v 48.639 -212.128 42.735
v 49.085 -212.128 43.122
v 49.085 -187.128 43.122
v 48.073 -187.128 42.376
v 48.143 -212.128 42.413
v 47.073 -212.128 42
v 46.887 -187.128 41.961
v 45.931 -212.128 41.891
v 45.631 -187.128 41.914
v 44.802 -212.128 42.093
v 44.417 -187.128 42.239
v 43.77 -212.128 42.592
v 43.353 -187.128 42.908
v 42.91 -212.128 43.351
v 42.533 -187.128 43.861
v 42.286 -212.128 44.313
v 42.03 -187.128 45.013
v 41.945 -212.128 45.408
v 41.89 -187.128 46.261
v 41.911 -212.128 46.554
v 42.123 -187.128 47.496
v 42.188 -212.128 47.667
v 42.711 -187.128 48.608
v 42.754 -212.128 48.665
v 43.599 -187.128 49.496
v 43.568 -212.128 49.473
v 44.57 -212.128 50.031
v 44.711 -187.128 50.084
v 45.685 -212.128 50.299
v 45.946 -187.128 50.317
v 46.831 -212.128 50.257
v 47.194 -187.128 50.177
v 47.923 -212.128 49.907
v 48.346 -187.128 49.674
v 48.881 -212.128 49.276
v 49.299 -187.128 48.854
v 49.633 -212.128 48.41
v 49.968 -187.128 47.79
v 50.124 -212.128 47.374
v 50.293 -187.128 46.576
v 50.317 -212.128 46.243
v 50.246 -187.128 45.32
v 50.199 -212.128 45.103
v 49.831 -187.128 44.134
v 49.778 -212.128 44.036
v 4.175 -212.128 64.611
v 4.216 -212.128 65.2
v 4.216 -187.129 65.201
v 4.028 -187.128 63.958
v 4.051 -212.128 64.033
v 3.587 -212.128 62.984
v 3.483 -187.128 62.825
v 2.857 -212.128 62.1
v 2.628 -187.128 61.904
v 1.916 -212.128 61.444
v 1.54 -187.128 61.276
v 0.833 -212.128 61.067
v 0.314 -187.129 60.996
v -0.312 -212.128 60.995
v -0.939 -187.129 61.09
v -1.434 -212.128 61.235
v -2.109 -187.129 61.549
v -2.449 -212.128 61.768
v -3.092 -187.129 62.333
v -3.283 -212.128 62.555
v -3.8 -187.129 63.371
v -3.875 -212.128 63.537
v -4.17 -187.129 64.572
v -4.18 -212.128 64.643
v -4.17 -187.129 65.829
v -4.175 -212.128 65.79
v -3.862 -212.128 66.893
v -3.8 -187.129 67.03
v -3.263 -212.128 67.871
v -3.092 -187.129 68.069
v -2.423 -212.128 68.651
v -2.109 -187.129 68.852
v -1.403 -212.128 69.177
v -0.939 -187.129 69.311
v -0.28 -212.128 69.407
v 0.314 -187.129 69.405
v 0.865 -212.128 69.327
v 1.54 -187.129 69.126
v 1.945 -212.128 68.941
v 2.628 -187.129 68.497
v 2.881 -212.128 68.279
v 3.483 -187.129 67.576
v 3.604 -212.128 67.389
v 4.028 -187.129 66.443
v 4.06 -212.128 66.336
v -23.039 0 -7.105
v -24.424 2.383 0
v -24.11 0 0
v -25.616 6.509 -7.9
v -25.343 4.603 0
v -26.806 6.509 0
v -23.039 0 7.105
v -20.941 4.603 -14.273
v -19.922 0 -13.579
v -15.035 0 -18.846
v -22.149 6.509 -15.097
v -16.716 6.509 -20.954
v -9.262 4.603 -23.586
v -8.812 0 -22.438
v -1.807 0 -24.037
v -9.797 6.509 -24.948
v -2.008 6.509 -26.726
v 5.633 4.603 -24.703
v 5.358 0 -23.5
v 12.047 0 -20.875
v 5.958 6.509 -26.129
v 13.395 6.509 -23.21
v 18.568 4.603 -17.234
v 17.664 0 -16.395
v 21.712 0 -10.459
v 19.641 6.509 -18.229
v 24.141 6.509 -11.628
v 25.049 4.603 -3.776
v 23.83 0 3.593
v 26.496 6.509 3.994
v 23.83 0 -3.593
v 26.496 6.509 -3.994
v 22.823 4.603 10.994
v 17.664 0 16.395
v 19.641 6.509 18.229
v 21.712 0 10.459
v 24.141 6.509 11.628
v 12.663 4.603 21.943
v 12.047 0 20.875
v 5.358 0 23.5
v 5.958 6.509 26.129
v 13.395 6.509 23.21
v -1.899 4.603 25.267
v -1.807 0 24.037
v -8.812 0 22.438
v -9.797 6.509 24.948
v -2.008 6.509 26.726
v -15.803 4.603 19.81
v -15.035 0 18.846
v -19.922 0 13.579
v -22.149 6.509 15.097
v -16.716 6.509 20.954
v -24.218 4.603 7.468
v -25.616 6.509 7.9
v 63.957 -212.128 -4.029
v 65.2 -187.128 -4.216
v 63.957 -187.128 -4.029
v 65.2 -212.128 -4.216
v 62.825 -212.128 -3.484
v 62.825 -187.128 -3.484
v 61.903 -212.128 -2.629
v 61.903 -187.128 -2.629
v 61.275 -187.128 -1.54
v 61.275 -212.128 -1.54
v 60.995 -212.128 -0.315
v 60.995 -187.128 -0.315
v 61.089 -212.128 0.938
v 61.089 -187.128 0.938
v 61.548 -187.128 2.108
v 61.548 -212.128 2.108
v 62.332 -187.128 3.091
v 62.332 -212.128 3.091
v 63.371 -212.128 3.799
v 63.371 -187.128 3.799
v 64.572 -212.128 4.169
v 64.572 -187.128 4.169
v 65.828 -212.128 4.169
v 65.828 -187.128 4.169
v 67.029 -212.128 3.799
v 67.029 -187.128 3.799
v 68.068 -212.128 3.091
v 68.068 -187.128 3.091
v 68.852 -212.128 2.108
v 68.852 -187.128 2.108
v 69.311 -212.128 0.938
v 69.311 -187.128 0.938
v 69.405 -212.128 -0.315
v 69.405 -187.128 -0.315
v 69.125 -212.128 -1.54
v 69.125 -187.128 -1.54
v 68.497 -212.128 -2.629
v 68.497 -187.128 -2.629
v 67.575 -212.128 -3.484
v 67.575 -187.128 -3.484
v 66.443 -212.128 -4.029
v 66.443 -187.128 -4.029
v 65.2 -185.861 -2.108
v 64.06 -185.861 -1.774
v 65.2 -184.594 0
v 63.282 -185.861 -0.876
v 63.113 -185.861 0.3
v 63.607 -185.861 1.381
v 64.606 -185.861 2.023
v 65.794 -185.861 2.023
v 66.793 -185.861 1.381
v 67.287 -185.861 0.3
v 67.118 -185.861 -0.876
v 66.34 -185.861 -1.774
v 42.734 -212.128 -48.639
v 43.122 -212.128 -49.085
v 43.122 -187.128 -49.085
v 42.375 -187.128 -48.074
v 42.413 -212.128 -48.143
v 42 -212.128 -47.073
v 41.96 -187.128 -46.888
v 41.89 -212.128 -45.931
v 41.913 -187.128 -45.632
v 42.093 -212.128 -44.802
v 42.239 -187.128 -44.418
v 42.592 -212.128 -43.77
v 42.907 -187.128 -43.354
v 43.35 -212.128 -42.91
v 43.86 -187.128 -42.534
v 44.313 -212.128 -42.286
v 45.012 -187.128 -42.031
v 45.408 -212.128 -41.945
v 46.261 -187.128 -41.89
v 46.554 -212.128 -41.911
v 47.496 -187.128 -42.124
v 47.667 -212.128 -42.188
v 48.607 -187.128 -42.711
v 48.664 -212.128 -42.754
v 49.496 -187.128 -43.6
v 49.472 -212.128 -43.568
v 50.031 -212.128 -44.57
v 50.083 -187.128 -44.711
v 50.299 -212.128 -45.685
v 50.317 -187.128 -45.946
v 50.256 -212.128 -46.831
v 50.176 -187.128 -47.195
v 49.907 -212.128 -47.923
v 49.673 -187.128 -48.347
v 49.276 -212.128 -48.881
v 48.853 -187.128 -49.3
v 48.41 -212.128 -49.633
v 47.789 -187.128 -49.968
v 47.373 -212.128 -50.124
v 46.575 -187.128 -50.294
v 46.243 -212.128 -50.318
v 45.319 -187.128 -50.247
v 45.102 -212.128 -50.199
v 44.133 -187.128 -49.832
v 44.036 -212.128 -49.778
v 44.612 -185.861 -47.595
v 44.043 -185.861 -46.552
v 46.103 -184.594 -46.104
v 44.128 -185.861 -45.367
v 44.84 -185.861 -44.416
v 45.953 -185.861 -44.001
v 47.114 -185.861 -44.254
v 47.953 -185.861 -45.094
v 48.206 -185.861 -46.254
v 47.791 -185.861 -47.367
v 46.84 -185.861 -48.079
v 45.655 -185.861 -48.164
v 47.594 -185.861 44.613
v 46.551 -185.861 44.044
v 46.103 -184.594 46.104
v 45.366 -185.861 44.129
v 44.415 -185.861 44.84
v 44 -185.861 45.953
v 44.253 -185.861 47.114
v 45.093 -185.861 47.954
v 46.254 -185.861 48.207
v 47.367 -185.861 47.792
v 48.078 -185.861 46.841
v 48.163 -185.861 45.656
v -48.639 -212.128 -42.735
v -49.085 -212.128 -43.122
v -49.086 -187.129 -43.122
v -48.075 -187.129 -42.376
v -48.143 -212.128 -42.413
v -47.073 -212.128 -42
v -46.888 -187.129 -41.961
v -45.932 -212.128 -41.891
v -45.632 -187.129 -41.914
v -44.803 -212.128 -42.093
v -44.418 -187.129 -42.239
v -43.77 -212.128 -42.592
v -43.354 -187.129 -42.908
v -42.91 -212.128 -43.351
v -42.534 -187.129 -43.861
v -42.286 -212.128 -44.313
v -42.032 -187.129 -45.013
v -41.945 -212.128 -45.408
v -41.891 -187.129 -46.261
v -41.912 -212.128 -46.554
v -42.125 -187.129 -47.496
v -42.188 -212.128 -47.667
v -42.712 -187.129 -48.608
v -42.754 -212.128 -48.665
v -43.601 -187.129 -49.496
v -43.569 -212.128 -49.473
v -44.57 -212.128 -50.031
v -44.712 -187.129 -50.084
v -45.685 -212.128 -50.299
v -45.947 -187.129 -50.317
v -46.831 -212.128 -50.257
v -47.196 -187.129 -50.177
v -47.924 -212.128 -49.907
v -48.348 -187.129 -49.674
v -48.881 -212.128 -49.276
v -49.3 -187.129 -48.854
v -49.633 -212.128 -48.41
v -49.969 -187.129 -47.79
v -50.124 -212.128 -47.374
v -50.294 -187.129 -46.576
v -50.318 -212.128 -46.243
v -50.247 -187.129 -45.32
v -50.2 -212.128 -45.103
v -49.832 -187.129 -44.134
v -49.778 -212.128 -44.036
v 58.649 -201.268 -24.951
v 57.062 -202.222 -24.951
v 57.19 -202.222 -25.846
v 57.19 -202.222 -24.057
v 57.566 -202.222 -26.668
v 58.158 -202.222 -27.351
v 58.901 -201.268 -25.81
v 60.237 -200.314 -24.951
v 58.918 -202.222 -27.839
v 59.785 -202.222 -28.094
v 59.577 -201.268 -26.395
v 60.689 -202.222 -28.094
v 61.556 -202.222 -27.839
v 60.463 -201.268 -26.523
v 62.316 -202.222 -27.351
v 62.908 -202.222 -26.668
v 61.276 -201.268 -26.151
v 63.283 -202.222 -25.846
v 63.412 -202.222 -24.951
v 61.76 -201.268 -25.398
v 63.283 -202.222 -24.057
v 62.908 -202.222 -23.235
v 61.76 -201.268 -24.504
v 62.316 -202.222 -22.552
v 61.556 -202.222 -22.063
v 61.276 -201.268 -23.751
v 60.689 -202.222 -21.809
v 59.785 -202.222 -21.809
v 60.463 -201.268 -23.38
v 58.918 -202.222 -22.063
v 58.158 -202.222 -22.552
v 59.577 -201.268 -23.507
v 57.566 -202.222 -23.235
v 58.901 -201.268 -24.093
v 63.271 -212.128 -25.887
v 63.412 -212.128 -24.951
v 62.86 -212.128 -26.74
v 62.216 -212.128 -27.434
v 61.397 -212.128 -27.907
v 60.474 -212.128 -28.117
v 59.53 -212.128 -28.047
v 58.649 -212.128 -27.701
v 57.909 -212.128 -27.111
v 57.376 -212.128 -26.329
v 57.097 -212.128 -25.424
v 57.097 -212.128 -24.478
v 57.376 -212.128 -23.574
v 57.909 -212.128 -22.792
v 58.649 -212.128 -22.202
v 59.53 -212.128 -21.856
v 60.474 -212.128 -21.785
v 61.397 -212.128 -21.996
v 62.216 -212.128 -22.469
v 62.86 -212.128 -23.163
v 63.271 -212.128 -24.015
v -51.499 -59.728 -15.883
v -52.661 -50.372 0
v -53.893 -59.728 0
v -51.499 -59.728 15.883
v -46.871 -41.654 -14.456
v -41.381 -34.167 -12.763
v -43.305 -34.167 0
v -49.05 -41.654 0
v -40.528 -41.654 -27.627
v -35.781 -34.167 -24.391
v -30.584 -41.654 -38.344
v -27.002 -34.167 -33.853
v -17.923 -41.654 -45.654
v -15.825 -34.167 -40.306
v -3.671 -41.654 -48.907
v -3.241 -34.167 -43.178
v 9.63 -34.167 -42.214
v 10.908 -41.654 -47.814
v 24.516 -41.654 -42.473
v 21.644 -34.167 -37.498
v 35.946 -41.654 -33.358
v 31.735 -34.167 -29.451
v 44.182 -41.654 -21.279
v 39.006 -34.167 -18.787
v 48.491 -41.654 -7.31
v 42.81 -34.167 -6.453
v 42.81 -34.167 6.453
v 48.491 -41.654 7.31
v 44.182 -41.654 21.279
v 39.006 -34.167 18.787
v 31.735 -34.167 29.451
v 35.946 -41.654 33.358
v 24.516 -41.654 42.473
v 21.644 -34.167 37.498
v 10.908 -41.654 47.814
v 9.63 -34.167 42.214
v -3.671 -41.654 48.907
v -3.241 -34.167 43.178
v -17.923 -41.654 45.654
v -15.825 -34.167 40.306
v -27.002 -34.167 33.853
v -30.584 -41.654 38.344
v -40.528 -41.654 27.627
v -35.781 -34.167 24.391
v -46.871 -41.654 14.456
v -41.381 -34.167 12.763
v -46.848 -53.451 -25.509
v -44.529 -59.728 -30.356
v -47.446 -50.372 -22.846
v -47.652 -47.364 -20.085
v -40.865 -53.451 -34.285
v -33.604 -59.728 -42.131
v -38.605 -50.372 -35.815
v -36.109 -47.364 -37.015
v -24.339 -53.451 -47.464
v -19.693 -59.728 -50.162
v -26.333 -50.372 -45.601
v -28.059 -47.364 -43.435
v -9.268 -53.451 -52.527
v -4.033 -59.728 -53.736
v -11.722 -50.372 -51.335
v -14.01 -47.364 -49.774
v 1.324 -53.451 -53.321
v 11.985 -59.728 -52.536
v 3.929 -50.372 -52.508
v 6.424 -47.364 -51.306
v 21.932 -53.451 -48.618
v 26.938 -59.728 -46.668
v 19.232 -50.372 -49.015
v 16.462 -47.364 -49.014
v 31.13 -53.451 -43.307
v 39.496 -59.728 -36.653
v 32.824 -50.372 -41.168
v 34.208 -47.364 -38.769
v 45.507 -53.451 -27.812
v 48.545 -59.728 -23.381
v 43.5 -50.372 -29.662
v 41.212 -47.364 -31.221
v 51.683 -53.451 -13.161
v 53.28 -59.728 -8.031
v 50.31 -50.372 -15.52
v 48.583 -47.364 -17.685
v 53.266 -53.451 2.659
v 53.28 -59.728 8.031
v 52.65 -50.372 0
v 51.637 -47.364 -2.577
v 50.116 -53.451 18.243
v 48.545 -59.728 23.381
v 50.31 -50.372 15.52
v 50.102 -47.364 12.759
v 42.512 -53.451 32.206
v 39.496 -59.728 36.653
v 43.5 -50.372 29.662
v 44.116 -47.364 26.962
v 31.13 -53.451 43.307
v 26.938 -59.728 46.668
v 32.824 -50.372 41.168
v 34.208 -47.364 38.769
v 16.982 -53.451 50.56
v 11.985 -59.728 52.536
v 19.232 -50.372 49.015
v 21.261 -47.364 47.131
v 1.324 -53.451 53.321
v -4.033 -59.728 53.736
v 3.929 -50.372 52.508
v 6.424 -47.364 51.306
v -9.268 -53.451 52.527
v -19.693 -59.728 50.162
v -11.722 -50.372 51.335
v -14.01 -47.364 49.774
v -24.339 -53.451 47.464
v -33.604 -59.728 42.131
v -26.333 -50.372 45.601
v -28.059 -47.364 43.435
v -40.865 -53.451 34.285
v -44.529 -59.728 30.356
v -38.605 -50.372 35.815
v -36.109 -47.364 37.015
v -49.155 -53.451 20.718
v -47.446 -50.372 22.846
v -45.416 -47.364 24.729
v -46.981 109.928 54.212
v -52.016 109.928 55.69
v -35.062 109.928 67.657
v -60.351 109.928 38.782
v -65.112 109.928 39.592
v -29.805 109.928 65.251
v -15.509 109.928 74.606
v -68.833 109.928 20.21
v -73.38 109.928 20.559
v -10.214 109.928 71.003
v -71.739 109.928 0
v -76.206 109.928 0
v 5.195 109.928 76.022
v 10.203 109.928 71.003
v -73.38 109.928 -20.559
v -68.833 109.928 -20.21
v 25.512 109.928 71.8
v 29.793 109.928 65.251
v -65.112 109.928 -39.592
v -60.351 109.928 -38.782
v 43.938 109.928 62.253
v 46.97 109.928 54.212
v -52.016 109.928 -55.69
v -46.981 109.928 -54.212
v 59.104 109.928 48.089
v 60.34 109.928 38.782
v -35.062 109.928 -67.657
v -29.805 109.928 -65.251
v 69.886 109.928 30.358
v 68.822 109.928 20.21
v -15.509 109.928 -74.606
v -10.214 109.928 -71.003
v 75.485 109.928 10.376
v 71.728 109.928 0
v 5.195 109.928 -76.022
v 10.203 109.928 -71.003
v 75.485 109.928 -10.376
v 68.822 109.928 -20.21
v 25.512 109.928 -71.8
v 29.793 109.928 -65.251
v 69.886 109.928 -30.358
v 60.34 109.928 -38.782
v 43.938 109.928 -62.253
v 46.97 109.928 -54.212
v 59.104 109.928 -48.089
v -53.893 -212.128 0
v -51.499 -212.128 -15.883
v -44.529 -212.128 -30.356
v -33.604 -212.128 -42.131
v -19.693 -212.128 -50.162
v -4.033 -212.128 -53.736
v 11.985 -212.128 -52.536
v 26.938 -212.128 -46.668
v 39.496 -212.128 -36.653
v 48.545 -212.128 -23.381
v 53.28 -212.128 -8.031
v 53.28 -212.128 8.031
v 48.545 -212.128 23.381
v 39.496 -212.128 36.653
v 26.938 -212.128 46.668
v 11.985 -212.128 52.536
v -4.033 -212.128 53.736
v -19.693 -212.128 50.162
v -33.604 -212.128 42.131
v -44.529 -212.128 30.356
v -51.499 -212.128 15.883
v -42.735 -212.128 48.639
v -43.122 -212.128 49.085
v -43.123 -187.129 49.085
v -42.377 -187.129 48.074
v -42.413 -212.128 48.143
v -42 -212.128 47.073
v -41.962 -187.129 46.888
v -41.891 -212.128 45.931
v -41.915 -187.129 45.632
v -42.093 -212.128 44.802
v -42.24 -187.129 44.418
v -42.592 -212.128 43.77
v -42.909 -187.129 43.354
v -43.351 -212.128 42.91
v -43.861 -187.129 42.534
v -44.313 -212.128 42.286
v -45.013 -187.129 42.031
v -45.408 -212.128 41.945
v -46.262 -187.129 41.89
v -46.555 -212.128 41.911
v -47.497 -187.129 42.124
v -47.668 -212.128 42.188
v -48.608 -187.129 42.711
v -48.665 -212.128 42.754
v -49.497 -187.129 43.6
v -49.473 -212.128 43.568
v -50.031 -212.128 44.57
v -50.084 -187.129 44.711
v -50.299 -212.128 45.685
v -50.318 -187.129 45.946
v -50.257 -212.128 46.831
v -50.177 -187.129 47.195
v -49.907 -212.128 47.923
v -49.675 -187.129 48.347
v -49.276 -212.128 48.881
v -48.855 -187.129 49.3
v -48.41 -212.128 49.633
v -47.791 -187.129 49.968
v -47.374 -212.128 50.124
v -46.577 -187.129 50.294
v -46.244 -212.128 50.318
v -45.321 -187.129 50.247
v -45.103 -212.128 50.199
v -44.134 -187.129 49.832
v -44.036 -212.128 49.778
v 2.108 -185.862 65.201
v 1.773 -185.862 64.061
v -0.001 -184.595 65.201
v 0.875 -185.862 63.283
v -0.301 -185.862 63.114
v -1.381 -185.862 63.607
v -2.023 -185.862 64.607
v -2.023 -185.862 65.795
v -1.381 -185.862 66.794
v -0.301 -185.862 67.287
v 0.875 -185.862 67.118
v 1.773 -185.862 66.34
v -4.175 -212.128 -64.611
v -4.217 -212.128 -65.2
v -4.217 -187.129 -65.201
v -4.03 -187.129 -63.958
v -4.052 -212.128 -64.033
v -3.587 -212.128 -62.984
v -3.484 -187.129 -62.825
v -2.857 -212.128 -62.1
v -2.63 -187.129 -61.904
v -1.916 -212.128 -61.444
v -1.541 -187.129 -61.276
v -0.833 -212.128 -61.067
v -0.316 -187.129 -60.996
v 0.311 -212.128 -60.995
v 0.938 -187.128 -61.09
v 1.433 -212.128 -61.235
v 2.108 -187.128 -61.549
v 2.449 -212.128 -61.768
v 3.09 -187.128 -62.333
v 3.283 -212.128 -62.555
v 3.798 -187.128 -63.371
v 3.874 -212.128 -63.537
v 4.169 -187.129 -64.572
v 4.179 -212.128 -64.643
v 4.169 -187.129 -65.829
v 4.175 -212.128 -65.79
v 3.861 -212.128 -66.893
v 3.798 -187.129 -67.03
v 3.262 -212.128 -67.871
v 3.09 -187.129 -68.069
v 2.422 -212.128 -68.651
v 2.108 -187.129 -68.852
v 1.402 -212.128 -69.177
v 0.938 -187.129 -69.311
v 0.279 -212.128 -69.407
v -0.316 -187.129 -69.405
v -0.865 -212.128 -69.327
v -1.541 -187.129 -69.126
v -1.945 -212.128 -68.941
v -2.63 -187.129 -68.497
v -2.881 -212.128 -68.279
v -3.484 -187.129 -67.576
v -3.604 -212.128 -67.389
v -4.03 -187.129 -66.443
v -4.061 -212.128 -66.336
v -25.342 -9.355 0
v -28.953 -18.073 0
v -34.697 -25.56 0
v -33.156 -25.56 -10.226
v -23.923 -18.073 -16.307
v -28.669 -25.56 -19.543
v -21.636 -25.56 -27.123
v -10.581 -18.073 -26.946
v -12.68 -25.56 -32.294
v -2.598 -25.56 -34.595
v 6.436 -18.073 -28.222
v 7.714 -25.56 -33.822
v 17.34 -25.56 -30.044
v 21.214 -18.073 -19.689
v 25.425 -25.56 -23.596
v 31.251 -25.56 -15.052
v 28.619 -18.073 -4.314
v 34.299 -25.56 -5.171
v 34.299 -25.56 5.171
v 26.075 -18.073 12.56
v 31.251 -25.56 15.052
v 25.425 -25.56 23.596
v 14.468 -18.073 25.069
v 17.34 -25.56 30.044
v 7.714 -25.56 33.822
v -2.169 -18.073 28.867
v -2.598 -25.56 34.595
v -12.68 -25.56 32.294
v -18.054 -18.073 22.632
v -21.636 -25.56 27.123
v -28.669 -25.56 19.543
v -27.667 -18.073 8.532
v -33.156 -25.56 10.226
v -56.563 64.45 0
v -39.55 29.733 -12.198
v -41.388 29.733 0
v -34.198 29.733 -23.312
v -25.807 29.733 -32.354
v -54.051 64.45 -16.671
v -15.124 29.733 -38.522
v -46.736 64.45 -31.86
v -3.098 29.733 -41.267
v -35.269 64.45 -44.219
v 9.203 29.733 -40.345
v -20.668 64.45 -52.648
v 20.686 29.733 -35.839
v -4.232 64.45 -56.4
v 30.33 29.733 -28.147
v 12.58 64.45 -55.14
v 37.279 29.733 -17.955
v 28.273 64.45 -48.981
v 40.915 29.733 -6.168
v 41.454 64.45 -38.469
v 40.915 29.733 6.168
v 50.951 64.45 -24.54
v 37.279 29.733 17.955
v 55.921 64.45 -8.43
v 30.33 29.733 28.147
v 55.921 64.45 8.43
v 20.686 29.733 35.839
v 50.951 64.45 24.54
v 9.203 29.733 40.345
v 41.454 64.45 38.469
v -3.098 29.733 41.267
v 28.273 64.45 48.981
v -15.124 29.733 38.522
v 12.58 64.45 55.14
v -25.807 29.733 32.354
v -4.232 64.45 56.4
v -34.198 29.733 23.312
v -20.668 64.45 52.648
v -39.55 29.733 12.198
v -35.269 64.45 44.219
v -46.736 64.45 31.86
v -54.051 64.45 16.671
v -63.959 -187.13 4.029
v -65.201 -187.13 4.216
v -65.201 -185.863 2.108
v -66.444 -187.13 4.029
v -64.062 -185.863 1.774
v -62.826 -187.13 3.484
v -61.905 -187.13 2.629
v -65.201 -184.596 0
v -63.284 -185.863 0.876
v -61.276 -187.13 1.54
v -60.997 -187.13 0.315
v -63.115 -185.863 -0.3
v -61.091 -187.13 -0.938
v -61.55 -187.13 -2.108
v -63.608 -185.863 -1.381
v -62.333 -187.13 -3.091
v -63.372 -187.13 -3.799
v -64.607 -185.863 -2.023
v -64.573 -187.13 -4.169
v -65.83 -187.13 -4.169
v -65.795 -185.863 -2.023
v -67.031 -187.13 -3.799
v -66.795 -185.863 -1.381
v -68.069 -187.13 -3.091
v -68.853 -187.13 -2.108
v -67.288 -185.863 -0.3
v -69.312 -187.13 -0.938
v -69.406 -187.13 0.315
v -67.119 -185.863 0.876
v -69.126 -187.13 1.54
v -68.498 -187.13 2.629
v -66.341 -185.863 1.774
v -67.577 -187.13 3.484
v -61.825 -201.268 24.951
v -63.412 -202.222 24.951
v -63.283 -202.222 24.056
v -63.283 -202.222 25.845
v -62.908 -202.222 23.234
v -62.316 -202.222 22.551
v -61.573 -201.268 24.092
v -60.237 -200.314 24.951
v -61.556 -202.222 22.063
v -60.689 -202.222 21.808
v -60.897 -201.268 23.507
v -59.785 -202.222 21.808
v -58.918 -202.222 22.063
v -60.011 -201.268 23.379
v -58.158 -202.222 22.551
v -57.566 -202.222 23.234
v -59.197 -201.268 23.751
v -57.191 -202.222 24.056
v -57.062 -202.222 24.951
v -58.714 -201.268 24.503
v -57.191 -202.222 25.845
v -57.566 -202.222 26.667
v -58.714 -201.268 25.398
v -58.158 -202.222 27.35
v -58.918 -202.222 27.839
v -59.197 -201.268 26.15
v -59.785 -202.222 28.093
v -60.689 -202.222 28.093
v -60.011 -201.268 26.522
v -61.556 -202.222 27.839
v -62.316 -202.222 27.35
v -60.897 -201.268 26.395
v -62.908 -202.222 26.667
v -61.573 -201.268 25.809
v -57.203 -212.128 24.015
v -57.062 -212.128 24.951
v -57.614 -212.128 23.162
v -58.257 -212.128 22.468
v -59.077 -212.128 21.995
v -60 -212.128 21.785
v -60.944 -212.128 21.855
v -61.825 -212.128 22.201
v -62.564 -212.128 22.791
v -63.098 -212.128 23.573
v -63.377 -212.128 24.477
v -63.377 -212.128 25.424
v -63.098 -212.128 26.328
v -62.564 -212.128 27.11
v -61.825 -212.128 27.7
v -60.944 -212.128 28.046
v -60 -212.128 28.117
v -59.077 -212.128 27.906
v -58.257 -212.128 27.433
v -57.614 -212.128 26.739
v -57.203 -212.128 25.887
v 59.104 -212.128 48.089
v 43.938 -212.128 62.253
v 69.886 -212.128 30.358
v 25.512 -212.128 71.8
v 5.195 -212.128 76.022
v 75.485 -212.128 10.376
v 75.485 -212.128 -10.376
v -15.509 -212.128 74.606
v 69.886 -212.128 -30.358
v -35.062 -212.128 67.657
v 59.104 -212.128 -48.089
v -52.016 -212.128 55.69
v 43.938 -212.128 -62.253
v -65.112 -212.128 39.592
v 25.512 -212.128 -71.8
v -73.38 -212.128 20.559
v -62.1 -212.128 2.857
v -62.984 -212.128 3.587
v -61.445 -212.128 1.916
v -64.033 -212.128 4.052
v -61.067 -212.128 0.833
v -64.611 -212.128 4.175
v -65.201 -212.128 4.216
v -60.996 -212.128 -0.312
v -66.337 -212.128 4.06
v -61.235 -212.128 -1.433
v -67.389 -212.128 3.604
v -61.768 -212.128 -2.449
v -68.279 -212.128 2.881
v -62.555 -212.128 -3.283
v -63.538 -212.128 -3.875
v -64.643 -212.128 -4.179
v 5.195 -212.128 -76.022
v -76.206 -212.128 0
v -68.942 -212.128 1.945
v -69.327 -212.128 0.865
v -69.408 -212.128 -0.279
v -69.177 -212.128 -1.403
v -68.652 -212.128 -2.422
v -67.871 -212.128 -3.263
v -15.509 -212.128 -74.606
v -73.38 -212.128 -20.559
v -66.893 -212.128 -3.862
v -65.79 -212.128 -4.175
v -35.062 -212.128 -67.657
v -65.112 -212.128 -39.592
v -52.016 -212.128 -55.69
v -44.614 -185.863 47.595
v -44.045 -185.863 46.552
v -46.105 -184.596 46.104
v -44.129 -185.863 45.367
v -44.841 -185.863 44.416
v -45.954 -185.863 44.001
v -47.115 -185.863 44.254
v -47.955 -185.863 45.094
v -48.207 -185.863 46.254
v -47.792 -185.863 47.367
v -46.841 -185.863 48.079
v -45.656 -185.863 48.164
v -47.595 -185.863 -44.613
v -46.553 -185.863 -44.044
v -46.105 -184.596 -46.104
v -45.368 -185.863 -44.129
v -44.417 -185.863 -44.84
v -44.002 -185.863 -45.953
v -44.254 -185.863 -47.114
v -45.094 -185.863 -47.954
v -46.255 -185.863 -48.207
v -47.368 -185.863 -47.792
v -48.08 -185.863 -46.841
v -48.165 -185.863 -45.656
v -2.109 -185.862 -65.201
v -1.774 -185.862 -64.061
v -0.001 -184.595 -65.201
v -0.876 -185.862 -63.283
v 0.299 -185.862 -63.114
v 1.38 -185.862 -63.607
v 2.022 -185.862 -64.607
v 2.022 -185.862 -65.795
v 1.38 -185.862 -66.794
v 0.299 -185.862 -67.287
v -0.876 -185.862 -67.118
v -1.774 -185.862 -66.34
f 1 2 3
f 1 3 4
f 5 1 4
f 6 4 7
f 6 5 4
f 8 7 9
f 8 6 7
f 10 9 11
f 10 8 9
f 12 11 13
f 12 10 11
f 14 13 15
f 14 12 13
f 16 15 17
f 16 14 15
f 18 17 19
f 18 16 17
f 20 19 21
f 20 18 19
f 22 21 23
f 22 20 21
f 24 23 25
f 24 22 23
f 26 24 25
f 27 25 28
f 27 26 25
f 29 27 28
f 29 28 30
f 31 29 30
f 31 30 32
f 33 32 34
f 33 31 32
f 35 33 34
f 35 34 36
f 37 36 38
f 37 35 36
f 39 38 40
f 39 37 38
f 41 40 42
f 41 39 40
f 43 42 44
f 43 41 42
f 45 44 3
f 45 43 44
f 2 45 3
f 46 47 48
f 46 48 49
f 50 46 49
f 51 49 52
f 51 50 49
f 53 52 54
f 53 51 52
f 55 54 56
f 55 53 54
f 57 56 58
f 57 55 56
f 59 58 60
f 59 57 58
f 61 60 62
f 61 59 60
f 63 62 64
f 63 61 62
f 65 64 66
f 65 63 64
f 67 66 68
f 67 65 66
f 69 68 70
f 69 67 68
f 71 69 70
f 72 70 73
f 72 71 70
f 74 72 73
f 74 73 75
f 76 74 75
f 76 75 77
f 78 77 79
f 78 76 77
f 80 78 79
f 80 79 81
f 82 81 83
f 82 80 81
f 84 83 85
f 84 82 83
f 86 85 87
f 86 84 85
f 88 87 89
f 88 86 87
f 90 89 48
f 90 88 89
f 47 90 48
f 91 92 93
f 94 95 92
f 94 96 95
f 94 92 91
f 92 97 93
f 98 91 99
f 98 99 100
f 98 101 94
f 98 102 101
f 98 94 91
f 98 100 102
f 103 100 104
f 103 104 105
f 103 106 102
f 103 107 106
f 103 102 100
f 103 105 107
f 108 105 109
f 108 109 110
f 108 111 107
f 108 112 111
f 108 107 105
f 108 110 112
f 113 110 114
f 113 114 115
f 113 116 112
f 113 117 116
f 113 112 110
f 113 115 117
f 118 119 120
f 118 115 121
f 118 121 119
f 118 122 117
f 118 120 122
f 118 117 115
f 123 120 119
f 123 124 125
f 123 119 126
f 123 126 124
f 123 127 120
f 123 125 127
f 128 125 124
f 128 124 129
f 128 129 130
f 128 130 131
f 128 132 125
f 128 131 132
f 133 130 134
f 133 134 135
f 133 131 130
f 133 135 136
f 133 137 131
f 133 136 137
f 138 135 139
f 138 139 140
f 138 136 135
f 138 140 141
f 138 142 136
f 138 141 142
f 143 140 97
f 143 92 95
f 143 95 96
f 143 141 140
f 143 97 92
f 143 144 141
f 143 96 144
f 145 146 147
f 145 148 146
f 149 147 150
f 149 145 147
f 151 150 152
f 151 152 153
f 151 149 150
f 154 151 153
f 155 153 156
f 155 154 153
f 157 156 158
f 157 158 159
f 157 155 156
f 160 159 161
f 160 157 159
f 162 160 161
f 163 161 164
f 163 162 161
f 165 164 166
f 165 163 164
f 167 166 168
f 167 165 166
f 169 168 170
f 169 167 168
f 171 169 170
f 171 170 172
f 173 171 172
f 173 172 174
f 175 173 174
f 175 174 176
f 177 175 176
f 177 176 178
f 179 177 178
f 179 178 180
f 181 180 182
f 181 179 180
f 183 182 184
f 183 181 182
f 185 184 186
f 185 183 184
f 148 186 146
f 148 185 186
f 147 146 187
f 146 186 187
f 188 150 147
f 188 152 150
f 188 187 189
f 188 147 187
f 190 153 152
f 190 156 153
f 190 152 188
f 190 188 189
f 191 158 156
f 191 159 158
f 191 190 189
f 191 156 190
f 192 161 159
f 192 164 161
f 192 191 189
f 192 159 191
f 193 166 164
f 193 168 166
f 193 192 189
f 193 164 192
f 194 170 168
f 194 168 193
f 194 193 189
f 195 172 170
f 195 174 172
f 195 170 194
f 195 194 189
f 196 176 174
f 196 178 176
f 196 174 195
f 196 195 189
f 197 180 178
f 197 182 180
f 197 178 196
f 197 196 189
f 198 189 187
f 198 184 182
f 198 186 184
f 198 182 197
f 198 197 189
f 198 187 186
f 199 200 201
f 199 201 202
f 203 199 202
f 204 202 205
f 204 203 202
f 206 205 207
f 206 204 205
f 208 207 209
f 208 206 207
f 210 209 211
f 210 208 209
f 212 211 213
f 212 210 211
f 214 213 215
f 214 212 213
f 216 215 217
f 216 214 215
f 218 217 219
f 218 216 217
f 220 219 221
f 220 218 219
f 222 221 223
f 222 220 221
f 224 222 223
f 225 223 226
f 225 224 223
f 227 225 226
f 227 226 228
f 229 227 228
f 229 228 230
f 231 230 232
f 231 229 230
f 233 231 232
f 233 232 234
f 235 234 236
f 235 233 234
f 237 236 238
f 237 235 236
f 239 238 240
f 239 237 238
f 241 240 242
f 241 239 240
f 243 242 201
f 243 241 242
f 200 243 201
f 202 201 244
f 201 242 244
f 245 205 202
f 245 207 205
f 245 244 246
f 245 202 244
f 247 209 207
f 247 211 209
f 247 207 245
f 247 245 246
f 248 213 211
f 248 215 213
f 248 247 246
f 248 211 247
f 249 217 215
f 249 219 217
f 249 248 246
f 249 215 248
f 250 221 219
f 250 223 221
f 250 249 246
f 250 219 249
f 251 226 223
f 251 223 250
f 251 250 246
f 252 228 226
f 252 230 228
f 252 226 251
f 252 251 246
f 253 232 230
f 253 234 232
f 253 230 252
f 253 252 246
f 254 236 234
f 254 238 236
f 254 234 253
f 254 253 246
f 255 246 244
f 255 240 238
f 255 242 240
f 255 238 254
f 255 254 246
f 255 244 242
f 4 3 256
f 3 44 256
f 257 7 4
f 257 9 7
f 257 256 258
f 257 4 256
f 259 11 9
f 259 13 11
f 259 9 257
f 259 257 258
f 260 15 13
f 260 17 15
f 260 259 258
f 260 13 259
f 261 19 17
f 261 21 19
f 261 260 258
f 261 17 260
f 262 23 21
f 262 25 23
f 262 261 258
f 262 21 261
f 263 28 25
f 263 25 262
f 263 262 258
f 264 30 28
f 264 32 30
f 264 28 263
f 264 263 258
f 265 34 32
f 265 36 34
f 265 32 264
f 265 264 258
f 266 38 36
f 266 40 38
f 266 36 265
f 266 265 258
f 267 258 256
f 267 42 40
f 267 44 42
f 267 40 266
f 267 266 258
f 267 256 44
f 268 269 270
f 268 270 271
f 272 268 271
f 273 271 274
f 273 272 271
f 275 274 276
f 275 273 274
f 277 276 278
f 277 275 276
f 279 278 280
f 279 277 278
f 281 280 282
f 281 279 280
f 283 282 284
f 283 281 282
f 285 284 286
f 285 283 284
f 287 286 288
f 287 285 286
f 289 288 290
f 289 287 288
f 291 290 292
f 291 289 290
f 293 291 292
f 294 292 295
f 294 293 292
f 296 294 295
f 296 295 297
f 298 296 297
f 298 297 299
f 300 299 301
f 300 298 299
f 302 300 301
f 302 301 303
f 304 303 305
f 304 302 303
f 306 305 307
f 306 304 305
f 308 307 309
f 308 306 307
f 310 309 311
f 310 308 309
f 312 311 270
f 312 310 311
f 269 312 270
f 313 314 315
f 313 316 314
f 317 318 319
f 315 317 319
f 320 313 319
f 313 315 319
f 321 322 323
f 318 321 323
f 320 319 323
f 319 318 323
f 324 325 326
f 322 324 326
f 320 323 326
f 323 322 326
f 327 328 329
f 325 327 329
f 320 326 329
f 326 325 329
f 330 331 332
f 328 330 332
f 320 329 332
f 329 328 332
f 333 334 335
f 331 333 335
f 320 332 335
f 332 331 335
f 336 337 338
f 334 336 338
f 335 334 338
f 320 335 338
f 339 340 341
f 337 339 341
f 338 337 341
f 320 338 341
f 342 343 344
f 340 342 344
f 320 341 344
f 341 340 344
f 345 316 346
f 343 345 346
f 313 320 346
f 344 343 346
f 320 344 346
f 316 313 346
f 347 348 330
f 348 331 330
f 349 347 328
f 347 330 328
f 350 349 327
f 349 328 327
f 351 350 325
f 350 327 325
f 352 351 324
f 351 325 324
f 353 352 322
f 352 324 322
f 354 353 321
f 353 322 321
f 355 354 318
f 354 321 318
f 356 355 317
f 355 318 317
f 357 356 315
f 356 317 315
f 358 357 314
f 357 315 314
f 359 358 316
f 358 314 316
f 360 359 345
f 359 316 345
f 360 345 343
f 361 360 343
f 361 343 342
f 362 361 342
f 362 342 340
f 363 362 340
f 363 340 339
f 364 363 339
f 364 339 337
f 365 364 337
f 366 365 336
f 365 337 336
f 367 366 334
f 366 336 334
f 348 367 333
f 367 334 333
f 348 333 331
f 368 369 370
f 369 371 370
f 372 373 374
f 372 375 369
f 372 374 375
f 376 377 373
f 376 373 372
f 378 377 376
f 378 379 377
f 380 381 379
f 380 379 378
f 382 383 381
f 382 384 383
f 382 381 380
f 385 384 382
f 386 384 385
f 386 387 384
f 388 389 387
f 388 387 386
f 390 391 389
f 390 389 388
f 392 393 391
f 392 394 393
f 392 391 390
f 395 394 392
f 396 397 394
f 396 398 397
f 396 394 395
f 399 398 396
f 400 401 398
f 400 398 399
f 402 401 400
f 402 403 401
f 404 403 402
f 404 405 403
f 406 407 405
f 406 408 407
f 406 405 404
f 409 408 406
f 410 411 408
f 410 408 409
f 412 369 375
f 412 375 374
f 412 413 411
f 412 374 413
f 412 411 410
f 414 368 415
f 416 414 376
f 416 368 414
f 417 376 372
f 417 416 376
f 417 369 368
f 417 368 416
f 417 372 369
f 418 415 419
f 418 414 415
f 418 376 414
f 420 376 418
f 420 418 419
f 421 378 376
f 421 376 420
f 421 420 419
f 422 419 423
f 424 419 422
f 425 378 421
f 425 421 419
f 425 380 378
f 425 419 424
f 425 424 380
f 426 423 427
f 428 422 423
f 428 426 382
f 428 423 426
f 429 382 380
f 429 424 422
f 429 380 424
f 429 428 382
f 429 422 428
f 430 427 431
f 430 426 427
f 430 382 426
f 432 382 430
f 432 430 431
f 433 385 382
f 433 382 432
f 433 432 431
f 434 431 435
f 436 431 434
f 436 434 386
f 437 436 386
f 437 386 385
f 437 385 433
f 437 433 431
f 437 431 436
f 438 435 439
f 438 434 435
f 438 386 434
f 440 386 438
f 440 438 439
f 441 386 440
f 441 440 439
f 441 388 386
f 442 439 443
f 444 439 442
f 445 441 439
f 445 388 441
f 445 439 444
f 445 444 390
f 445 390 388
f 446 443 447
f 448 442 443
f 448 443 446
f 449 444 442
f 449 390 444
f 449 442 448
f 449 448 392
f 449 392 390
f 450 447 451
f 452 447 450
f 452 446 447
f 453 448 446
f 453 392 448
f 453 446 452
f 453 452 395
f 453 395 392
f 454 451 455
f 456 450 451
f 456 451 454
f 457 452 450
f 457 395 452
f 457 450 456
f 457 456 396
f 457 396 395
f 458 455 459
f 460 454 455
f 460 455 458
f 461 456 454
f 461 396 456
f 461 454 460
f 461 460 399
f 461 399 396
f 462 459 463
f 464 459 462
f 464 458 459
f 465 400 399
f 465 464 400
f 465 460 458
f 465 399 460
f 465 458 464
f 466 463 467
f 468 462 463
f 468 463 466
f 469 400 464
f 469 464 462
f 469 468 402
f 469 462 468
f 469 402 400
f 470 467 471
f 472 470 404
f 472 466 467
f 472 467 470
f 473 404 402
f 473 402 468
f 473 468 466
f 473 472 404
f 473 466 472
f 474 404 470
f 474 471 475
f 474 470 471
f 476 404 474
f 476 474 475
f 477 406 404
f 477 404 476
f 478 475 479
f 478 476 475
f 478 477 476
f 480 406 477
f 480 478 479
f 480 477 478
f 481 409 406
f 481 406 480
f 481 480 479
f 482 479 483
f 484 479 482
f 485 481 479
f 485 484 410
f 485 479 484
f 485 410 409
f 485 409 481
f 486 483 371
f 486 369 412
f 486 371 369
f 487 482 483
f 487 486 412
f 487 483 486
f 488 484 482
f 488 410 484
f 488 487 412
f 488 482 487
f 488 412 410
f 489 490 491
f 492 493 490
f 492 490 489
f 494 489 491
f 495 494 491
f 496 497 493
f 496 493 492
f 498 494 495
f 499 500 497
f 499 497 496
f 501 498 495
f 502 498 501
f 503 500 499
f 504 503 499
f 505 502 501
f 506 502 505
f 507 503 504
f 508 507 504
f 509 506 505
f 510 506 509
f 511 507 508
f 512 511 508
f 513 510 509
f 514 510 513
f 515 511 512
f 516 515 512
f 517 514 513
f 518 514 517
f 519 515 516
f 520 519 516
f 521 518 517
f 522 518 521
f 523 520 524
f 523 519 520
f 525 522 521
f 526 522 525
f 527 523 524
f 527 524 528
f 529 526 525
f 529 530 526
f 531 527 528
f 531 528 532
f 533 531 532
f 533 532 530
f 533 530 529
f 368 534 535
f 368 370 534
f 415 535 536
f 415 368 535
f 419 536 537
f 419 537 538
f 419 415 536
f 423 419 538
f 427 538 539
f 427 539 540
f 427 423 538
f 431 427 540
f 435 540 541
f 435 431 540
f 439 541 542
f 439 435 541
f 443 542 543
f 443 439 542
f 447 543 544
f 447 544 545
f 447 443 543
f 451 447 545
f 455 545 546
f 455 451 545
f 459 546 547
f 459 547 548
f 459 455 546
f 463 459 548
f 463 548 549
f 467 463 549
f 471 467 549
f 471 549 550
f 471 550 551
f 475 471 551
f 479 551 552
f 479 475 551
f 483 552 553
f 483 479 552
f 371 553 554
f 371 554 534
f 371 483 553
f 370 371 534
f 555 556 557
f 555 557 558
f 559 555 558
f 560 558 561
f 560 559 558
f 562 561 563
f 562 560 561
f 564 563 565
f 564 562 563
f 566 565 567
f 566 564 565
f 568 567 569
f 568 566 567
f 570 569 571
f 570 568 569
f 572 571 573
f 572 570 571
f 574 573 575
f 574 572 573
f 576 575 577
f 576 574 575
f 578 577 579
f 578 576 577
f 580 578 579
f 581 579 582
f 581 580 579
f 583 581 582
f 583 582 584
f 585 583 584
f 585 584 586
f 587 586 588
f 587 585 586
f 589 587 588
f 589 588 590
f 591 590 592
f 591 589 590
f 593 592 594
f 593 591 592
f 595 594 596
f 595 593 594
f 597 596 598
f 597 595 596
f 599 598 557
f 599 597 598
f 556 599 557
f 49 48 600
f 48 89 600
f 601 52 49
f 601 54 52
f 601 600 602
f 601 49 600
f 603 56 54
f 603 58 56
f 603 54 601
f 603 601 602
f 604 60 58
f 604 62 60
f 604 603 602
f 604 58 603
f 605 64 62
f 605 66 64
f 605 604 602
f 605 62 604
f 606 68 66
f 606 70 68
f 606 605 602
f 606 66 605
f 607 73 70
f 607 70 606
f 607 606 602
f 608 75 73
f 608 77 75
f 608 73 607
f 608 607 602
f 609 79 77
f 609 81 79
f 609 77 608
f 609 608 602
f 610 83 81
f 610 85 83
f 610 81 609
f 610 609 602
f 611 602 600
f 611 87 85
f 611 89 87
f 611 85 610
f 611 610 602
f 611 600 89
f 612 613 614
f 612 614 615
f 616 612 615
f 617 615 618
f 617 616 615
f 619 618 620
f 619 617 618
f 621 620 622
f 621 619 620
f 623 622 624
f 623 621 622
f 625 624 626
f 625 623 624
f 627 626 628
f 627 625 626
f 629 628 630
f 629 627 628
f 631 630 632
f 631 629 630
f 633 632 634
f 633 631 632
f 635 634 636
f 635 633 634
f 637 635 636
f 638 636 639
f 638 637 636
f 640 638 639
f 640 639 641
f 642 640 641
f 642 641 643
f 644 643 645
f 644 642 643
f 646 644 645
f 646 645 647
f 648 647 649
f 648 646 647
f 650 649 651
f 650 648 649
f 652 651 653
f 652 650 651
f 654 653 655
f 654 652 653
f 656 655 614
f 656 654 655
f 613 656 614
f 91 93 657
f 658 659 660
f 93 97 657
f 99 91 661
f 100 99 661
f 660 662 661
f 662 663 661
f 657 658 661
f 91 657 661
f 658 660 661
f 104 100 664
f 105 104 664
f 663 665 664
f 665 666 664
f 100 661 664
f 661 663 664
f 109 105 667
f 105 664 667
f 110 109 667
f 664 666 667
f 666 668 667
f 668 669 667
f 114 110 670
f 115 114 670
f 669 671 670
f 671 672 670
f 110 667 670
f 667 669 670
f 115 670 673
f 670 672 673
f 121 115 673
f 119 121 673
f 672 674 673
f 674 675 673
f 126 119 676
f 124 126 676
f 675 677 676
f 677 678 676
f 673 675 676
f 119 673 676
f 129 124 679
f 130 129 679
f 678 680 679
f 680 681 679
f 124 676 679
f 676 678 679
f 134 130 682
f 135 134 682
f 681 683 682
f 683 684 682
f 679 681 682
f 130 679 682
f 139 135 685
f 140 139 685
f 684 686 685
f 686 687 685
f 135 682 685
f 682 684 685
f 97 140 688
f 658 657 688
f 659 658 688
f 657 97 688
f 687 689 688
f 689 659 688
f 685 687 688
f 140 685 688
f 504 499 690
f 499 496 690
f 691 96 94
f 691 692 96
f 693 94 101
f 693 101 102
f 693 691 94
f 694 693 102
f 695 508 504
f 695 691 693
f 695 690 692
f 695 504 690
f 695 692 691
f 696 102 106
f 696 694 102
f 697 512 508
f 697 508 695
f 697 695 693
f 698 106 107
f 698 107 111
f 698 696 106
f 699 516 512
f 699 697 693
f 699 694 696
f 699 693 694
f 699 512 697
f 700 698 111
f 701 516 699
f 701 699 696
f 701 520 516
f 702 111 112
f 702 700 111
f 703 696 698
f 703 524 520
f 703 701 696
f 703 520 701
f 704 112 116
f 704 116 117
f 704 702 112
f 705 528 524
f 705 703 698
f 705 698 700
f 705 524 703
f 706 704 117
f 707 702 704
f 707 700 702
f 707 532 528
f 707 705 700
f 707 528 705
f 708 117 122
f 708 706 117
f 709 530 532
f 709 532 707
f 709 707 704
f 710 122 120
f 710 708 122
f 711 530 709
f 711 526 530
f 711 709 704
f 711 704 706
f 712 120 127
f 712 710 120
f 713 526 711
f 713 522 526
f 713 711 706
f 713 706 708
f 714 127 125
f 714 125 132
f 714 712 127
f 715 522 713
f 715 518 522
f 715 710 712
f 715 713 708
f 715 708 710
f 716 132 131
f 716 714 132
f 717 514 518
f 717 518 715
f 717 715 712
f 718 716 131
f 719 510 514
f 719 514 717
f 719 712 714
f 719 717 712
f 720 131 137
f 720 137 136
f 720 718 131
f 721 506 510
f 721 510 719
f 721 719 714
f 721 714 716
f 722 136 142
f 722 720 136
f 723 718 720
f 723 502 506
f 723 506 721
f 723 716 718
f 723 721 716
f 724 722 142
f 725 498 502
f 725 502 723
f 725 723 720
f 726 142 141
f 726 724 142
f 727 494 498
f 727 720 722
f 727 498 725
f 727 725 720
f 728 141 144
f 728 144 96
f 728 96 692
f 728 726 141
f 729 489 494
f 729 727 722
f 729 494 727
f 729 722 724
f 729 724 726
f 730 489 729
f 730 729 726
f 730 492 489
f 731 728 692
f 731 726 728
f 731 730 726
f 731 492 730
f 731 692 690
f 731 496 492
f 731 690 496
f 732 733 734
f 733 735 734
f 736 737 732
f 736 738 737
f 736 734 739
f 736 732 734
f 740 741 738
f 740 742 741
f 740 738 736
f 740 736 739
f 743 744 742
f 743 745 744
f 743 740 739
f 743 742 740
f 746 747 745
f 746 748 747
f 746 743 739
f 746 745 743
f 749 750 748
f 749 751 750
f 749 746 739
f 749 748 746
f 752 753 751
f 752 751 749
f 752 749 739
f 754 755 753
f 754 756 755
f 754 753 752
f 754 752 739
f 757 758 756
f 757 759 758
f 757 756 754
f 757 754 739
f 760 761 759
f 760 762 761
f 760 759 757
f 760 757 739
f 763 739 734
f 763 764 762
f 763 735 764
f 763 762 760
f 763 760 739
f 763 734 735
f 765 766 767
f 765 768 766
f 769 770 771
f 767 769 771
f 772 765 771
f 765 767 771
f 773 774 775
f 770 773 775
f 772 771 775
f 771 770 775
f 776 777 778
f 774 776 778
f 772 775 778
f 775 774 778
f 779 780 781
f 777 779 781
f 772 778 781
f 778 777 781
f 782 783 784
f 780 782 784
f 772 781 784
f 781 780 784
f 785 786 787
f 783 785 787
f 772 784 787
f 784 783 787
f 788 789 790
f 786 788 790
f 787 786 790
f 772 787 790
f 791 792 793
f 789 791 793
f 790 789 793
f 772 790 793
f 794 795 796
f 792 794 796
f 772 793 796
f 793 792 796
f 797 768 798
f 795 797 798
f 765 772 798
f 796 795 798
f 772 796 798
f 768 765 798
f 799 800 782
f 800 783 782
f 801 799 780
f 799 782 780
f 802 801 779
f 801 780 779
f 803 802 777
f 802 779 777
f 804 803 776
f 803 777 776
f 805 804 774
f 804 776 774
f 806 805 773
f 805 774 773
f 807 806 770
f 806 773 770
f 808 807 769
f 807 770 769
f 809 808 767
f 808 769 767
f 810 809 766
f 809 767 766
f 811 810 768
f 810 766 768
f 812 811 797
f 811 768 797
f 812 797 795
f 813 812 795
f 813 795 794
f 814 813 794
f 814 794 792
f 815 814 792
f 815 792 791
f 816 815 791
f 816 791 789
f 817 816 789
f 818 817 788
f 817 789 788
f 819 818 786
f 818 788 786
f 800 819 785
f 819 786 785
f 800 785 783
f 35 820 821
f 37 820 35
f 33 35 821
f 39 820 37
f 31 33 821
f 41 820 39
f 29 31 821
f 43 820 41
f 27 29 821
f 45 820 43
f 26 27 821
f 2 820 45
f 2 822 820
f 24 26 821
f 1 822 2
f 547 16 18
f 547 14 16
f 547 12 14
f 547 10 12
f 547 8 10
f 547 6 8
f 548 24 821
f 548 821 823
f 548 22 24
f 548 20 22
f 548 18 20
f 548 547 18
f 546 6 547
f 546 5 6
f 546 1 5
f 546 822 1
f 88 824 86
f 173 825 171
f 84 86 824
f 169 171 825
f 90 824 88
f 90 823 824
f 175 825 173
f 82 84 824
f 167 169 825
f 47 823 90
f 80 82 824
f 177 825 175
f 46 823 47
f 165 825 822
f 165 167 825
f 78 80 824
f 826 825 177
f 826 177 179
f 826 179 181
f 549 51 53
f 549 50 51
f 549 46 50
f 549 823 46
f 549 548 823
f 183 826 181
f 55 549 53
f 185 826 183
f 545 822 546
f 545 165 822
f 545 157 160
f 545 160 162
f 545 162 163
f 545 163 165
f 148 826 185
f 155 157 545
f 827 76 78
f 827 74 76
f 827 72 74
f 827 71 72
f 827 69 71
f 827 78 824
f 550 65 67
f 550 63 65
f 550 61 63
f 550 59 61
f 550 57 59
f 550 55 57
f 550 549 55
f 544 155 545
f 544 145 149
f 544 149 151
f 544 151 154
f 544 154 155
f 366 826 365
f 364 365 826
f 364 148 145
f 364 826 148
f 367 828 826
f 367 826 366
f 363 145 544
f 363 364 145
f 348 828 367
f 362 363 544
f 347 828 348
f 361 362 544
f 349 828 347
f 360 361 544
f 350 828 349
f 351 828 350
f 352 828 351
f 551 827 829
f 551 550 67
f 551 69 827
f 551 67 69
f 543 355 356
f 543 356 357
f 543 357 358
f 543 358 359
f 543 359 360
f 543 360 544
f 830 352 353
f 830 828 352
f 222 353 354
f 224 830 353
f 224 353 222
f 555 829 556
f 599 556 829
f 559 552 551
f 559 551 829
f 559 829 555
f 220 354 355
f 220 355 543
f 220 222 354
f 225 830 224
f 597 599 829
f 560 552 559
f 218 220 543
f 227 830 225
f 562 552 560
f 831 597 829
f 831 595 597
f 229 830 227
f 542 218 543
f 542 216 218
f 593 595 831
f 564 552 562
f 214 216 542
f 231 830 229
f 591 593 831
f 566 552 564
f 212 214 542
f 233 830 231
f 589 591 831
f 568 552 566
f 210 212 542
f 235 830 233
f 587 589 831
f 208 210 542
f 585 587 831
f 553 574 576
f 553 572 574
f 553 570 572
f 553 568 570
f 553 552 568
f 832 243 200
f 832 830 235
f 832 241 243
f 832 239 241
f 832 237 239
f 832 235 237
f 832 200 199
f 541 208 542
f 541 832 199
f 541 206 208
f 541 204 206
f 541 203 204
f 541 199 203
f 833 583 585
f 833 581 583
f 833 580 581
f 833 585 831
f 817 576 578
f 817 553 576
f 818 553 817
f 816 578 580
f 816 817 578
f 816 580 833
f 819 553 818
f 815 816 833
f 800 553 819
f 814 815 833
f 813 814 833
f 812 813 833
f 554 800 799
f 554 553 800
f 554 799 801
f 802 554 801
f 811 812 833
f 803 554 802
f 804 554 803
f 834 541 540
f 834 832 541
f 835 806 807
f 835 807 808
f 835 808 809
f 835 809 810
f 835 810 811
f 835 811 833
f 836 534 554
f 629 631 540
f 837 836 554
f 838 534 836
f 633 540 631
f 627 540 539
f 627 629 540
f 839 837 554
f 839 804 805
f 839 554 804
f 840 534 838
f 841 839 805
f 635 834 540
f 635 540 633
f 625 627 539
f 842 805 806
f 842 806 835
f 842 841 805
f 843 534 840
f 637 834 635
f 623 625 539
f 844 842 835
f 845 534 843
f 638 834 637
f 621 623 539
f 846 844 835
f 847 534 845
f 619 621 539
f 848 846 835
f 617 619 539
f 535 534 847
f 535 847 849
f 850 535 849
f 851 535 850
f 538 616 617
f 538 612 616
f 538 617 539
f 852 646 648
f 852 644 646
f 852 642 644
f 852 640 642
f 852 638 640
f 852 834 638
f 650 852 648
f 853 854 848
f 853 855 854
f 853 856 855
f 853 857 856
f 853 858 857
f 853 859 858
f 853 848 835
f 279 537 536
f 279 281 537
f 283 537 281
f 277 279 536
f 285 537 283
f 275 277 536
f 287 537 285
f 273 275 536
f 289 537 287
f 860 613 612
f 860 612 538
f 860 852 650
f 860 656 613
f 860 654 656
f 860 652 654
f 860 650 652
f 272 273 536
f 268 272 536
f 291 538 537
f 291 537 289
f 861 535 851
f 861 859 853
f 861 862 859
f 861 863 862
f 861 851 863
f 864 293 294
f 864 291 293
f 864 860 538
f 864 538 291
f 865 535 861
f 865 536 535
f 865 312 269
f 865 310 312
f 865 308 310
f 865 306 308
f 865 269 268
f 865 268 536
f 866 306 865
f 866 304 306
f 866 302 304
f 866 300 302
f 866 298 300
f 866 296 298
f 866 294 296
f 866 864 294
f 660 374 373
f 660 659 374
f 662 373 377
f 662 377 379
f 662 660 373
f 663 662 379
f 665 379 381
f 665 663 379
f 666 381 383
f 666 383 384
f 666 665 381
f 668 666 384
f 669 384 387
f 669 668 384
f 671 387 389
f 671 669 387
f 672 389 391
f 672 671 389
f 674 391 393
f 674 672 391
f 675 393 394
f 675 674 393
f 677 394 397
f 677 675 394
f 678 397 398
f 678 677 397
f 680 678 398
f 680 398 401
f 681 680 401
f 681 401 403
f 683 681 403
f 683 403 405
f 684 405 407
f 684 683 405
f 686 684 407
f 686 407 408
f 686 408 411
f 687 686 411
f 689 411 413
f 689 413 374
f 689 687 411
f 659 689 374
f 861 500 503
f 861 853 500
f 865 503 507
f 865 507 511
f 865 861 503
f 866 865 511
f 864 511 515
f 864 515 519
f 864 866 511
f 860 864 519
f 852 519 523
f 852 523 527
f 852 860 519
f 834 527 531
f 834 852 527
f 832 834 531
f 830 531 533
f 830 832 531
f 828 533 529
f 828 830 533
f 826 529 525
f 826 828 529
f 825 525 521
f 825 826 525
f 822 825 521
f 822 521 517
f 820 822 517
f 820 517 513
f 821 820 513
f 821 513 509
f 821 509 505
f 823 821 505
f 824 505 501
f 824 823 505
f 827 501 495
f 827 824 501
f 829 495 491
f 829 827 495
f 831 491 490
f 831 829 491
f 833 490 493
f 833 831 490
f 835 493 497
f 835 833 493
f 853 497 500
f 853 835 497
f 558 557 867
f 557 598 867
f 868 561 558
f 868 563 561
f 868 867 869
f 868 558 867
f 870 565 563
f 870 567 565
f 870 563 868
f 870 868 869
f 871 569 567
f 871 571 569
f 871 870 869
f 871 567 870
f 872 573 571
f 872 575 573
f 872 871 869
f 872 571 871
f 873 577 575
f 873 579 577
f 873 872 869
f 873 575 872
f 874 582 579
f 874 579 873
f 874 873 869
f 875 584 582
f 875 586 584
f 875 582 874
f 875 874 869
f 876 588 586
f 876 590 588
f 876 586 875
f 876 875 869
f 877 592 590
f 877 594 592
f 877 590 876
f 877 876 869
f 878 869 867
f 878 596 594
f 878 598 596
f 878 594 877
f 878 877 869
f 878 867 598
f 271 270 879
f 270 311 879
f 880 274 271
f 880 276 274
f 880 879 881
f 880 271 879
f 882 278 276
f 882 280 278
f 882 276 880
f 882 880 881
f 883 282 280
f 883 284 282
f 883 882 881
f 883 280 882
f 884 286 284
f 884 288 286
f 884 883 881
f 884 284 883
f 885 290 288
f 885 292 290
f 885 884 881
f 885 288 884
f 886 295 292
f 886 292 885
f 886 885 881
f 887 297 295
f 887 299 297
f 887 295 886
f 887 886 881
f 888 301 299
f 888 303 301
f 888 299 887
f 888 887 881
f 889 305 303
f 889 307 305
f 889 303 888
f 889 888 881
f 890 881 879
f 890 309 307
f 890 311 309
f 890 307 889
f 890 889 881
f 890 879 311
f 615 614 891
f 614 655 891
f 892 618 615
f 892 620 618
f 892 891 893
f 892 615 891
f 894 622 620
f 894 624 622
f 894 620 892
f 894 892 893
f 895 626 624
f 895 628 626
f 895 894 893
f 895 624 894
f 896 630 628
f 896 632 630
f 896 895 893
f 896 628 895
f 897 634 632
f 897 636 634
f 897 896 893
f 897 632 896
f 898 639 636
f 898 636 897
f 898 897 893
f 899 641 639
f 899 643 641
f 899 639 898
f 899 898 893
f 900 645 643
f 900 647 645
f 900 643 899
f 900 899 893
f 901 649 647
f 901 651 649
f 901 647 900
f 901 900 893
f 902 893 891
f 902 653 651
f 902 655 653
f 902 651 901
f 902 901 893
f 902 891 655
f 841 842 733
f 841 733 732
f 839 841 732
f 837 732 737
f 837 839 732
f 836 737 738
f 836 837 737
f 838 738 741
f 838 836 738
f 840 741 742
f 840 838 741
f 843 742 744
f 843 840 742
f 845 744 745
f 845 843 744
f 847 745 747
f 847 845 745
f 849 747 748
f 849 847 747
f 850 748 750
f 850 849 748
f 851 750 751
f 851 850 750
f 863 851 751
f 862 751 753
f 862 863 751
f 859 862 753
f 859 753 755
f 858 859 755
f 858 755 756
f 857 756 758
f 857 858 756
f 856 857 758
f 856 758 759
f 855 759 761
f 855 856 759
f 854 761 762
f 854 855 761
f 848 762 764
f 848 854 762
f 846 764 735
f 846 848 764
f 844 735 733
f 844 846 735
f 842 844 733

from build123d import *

# Parameters (mm, degrees)
CIRPATTERN1_COUNT              = 8
F_1_4_0_2500_DOWEL_HOLE1_D     = 6.35
F_1_4_0_2500_DOWEL_HOLE1_DEPTH = 9.906
F_1_4_0_2500_DOWEL_HOLE1_TIP   = 1.907732465


with BuildPart() as part:
    # Sketch1 → Revolve2 (revolve)
    with BuildSketch(Plane.XY, mode=Mode.PRIVATE) as revolve2_sk:
        with BuildLine():
            Line((71.727523602, 109.927507641), (76.194467874, 109.927507641))
            Line((76.194467874, 109.927507641), (76.194467874, -212.127513222))
            Line((76.194467874, -212.127513222), (53.881527661, -212.127513222))
            Line((53.881527661, -212.127513222), (53.881527661, -59.727513222))
            add(Edge.make_bspline(
                [(53.881527661, -59.727513222), (53.88152643, -59.656983156), (53.880997287, -59.515406102), (53.878621437, -59.181564616), (53.872296838, -58.904795492), (53.862811351, -58.532567487), (53.850168453, -58.212837621), (53.830417626, -57.781594442), (53.800405285, -57.280959899), (53.756193121, -56.687998165), (53.677288452, -55.848480365), (53.577426861, -55.00816586), (53.456675786, -54.17243543), (53.286810822, -53.172425239), (53.092064187, -52.177442821), (52.86637512, -51.188539083), (52.610014224, -50.207489038), (52.32928934, -49.23307774), (52.024348739, -48.265969223), (51.633537831, -47.149135067), (51.139520361, -45.890408405), (50.598733752, -44.650968803), (50.012060927, -43.432701525), (49.38012023, -42.237093238), (48.704125229, -41.066154878), (47.984475519, -39.920972657), (47.223102138, -38.804076239), (46.51986906, -37.851451785), (45.893537937, -37.055672122), (45.35281768, -36.403381282), (44.915126948, -35.894247632), (44.514776189, -35.446992657), (44.181457503, -35.084631185), (43.873924624, -34.760340151), (43.674072406, -34.55154945), (43.444392072, -34.318516287), (43.343783151, -34.217162055), (43.293911001, -34.167289665)],
                knots=[0.082637729, 0.082637729, 0.082637729, 0.082637729, 0.082637729, 0.092574926, 0.102512123, 0.11244932, 0.122386517, 0.132323714, 0.142260911, 0.162135305, 0.182009699, 0.201884093, 0.24163288, 0.261507274, 0.281381668, 0.321130456, 0.360879243, 0.380753637, 0.400628031, 0.440376819, 0.480125606, 0.519874394, 0.559623181, 0.599371969, 0.639120757, 0.678869544, 0.718618332, 0.75836712, 0.798115907, 0.817990301, 0.837864695, 0.857739089, 0.877613483, 0.88755068, 0.897487877, 0.907425074, 0.91736227, 0.91736227, 0.91736227, 0.91736227, 0.91736227], degree=4))
            Line((43.293911001, -34.167289665), (34.686282803, -25.559661468))
            add(Edge.make_bspline(
                [(24.099067874, 0.000160672), (24.099069105, -0.070367974), (24.099598252, -0.213423517), (24.101973937, -0.543022243), (24.108298331, -0.823999723), (24.117783452, -1.194661398), (24.130425744, -1.513274385), (24.146225968, -1.86177893), (24.165181227, -2.193546199), (24.192818841, -2.617908727), (24.232287047, -3.121873274), (24.303299707, -3.879818002), (24.423126678, -4.886289716), (24.599486044, -6.056550088), (24.850885233, -7.385005743), (25.151795313, -8.703413844), (25.501770623, -10.009476539), (25.900360983, -11.301658928), (26.346945392, -12.577938667), (26.841003323, -13.836726817), (27.381673122, -15.076036463), (27.968479387, -16.294449129), (28.600139398, -17.489778131), (29.276532396, -18.661127096), (29.995445102, -19.805582737), (30.758021999, -20.923699417), (31.459167193, -21.874251104), (32.088736123, -22.673284825), (32.624128416, -23.320261484), (33.072255768, -23.839844364), (33.508450026, -24.329655594), (33.935826121, -24.788323739), (34.24555864, -25.11370766), (34.536859958, -25.409488397), (34.636412426, -25.509789283), (34.686282803, -25.559661468)],
                knots=[0.082637729, 0.082637729, 0.082637729, 0.082637729, 0.082637729, 0.092574926, 0.102512123, 0.11244932, 0.122386517, 0.132323714, 0.142260911, 0.152198108, 0.162135305, 0.182009699, 0.201884093, 0.24163288, 0.281381668, 0.321130456, 0.360879243, 0.400628031, 0.440376819, 0.480125606, 0.519874394, 0.559623181, 0.599371969, 0.639120757, 0.678869544, 0.718618332, 0.75836712, 0.798115907, 0.817990301, 0.837864695, 0.857739089, 0.877613483, 0.897487877, 0.907425074, 0.91736227, 0.91736227, 0.91736227, 0.91736227, 0.91736227], degree=4))
            add(Edge.make_bspline(
                [(24.099067874, 0.000160672), (24.0990685, 0.036053324), (24.099606331, 0.110274362), (24.102023723, 0.267801742), (24.108461568, 0.427224789), (24.120533599, 0.646924939), (24.141435087, 0.901594), (24.175184719, 1.202697945), (24.226499305, 1.54221117), (24.290543701, 1.881157449), (24.367141601, 2.216515092), (24.456323571, 2.549400093), (24.557741413, 2.878253317), (24.671619071, 3.203507713), (24.797196771, 3.523787829), (24.935285977, 3.839827405), (25.084070301, 4.149442857), (25.246012222, 4.454943795), (25.416488505, 4.751462248), (25.602514721, 5.045864533), (25.79178827, 5.325679608), (26.004405474, 5.610888215), (26.178876374, 5.83307432), (26.366345756, 6.050112309), (26.504555248, 6.208802318), (26.67044207, 6.382282451), (26.744520261, 6.458639514), (26.795279203, 6.509400323)],
                knots=[0.082568816, 0.082568816, 0.082568816, 0.082568816, 0.082568816, 0.102426634, 0.122284453, 0.142142271, 0.162000089, 0.201715725, 0.241431362, 0.281146998, 0.320862634, 0.360578271, 0.400293907, 0.440009544, 0.47972518, 0.519440816, 0.559156453, 0.598872089, 0.638587725, 0.678303362, 0.718018998, 0.757734635, 0.797450271, 0.837165907, 0.857023726, 0.876881544, 0.91659718, 0.91659718, 0.91659718, 0.91659718, 0.91659718], degree=4))
            add(Edge.make_bspline(
                [(26.795279203, 6.509400323), (49.261401403, 34.636114842), (71.727523602, 109.927507641)],
                knots=[0, 0, 0, 1, 1, 1], degree=2))
        make_face()
    revolve(revolve2_sk.sketch.rotate(Axis((-0.005532126, 165.815985114, 0), (0, -1, 0)), 180), axis=Axis((-0.005532126, 165.815985114, 0), (0, -1, 0)))

    # Sketch4 → 3/8-24 Tapped Hole1 (revolve, cut)
    with BuildSketch(Plane(origin=(65.2, -212.127513222, 0), x_dir=(0, 0, -1), z_dir=(1, 0, 0))):
        Polygon((0, 0), (0, 27.533468714), (4.2164, 25), (4.2164, 0), align=None)
    f_3_8_24_tapped_hole1 = revolve(axis=Axis((65.2, -218.477513222, 0), (0, 1, 0)), mode=Mode.SUBTRACT)

    # CirPattern1: 3/8-24 Tapped Hole1 ×8 about axis
    cirpattern1_axis = Axis((0, -228.487022387, 0), (-1.634718801334702e-05, 0.9999999998663848, 0))
    for i in range(1, CIRPATTERN1_COUNT):
        add(f_3_8_24_tapped_hole1.rotate(cirpattern1_axis, i * 360 / CIRPATTERN1_COUNT), mode=Mode.SUBTRACT)

    # 1/4 (0.2500) Dowel Hole1
    with Locations(Plane(origin=(0, -212.127513222, 0), x_dir=(-1, 0, 0), z_dir=(0, -1, 0))):
        with Locations((-60.236831784, 24.951234372), (60.23705925, -24.95068522)):
            Hole(F_1_4_0_2500_DOWEL_HOLE1_D / 2, depth=F_1_4_0_2500_DOWEL_HOLE1_DEPTH)
            with Locations((0, 0, -(F_1_4_0_2500_DOWEL_HOLE1_DEPTH + F_1_4_0_2500_DOWEL_HOLE1_TIP / 2))):  # 118° drill point
                Cone(0, F_1_4_0_2500_DOWEL_HOLE1_D / 2, F_1_4_0_2500_DOWEL_HOLE1_TIP, mode=Mode.SUBTRACT)


solid = part.part
